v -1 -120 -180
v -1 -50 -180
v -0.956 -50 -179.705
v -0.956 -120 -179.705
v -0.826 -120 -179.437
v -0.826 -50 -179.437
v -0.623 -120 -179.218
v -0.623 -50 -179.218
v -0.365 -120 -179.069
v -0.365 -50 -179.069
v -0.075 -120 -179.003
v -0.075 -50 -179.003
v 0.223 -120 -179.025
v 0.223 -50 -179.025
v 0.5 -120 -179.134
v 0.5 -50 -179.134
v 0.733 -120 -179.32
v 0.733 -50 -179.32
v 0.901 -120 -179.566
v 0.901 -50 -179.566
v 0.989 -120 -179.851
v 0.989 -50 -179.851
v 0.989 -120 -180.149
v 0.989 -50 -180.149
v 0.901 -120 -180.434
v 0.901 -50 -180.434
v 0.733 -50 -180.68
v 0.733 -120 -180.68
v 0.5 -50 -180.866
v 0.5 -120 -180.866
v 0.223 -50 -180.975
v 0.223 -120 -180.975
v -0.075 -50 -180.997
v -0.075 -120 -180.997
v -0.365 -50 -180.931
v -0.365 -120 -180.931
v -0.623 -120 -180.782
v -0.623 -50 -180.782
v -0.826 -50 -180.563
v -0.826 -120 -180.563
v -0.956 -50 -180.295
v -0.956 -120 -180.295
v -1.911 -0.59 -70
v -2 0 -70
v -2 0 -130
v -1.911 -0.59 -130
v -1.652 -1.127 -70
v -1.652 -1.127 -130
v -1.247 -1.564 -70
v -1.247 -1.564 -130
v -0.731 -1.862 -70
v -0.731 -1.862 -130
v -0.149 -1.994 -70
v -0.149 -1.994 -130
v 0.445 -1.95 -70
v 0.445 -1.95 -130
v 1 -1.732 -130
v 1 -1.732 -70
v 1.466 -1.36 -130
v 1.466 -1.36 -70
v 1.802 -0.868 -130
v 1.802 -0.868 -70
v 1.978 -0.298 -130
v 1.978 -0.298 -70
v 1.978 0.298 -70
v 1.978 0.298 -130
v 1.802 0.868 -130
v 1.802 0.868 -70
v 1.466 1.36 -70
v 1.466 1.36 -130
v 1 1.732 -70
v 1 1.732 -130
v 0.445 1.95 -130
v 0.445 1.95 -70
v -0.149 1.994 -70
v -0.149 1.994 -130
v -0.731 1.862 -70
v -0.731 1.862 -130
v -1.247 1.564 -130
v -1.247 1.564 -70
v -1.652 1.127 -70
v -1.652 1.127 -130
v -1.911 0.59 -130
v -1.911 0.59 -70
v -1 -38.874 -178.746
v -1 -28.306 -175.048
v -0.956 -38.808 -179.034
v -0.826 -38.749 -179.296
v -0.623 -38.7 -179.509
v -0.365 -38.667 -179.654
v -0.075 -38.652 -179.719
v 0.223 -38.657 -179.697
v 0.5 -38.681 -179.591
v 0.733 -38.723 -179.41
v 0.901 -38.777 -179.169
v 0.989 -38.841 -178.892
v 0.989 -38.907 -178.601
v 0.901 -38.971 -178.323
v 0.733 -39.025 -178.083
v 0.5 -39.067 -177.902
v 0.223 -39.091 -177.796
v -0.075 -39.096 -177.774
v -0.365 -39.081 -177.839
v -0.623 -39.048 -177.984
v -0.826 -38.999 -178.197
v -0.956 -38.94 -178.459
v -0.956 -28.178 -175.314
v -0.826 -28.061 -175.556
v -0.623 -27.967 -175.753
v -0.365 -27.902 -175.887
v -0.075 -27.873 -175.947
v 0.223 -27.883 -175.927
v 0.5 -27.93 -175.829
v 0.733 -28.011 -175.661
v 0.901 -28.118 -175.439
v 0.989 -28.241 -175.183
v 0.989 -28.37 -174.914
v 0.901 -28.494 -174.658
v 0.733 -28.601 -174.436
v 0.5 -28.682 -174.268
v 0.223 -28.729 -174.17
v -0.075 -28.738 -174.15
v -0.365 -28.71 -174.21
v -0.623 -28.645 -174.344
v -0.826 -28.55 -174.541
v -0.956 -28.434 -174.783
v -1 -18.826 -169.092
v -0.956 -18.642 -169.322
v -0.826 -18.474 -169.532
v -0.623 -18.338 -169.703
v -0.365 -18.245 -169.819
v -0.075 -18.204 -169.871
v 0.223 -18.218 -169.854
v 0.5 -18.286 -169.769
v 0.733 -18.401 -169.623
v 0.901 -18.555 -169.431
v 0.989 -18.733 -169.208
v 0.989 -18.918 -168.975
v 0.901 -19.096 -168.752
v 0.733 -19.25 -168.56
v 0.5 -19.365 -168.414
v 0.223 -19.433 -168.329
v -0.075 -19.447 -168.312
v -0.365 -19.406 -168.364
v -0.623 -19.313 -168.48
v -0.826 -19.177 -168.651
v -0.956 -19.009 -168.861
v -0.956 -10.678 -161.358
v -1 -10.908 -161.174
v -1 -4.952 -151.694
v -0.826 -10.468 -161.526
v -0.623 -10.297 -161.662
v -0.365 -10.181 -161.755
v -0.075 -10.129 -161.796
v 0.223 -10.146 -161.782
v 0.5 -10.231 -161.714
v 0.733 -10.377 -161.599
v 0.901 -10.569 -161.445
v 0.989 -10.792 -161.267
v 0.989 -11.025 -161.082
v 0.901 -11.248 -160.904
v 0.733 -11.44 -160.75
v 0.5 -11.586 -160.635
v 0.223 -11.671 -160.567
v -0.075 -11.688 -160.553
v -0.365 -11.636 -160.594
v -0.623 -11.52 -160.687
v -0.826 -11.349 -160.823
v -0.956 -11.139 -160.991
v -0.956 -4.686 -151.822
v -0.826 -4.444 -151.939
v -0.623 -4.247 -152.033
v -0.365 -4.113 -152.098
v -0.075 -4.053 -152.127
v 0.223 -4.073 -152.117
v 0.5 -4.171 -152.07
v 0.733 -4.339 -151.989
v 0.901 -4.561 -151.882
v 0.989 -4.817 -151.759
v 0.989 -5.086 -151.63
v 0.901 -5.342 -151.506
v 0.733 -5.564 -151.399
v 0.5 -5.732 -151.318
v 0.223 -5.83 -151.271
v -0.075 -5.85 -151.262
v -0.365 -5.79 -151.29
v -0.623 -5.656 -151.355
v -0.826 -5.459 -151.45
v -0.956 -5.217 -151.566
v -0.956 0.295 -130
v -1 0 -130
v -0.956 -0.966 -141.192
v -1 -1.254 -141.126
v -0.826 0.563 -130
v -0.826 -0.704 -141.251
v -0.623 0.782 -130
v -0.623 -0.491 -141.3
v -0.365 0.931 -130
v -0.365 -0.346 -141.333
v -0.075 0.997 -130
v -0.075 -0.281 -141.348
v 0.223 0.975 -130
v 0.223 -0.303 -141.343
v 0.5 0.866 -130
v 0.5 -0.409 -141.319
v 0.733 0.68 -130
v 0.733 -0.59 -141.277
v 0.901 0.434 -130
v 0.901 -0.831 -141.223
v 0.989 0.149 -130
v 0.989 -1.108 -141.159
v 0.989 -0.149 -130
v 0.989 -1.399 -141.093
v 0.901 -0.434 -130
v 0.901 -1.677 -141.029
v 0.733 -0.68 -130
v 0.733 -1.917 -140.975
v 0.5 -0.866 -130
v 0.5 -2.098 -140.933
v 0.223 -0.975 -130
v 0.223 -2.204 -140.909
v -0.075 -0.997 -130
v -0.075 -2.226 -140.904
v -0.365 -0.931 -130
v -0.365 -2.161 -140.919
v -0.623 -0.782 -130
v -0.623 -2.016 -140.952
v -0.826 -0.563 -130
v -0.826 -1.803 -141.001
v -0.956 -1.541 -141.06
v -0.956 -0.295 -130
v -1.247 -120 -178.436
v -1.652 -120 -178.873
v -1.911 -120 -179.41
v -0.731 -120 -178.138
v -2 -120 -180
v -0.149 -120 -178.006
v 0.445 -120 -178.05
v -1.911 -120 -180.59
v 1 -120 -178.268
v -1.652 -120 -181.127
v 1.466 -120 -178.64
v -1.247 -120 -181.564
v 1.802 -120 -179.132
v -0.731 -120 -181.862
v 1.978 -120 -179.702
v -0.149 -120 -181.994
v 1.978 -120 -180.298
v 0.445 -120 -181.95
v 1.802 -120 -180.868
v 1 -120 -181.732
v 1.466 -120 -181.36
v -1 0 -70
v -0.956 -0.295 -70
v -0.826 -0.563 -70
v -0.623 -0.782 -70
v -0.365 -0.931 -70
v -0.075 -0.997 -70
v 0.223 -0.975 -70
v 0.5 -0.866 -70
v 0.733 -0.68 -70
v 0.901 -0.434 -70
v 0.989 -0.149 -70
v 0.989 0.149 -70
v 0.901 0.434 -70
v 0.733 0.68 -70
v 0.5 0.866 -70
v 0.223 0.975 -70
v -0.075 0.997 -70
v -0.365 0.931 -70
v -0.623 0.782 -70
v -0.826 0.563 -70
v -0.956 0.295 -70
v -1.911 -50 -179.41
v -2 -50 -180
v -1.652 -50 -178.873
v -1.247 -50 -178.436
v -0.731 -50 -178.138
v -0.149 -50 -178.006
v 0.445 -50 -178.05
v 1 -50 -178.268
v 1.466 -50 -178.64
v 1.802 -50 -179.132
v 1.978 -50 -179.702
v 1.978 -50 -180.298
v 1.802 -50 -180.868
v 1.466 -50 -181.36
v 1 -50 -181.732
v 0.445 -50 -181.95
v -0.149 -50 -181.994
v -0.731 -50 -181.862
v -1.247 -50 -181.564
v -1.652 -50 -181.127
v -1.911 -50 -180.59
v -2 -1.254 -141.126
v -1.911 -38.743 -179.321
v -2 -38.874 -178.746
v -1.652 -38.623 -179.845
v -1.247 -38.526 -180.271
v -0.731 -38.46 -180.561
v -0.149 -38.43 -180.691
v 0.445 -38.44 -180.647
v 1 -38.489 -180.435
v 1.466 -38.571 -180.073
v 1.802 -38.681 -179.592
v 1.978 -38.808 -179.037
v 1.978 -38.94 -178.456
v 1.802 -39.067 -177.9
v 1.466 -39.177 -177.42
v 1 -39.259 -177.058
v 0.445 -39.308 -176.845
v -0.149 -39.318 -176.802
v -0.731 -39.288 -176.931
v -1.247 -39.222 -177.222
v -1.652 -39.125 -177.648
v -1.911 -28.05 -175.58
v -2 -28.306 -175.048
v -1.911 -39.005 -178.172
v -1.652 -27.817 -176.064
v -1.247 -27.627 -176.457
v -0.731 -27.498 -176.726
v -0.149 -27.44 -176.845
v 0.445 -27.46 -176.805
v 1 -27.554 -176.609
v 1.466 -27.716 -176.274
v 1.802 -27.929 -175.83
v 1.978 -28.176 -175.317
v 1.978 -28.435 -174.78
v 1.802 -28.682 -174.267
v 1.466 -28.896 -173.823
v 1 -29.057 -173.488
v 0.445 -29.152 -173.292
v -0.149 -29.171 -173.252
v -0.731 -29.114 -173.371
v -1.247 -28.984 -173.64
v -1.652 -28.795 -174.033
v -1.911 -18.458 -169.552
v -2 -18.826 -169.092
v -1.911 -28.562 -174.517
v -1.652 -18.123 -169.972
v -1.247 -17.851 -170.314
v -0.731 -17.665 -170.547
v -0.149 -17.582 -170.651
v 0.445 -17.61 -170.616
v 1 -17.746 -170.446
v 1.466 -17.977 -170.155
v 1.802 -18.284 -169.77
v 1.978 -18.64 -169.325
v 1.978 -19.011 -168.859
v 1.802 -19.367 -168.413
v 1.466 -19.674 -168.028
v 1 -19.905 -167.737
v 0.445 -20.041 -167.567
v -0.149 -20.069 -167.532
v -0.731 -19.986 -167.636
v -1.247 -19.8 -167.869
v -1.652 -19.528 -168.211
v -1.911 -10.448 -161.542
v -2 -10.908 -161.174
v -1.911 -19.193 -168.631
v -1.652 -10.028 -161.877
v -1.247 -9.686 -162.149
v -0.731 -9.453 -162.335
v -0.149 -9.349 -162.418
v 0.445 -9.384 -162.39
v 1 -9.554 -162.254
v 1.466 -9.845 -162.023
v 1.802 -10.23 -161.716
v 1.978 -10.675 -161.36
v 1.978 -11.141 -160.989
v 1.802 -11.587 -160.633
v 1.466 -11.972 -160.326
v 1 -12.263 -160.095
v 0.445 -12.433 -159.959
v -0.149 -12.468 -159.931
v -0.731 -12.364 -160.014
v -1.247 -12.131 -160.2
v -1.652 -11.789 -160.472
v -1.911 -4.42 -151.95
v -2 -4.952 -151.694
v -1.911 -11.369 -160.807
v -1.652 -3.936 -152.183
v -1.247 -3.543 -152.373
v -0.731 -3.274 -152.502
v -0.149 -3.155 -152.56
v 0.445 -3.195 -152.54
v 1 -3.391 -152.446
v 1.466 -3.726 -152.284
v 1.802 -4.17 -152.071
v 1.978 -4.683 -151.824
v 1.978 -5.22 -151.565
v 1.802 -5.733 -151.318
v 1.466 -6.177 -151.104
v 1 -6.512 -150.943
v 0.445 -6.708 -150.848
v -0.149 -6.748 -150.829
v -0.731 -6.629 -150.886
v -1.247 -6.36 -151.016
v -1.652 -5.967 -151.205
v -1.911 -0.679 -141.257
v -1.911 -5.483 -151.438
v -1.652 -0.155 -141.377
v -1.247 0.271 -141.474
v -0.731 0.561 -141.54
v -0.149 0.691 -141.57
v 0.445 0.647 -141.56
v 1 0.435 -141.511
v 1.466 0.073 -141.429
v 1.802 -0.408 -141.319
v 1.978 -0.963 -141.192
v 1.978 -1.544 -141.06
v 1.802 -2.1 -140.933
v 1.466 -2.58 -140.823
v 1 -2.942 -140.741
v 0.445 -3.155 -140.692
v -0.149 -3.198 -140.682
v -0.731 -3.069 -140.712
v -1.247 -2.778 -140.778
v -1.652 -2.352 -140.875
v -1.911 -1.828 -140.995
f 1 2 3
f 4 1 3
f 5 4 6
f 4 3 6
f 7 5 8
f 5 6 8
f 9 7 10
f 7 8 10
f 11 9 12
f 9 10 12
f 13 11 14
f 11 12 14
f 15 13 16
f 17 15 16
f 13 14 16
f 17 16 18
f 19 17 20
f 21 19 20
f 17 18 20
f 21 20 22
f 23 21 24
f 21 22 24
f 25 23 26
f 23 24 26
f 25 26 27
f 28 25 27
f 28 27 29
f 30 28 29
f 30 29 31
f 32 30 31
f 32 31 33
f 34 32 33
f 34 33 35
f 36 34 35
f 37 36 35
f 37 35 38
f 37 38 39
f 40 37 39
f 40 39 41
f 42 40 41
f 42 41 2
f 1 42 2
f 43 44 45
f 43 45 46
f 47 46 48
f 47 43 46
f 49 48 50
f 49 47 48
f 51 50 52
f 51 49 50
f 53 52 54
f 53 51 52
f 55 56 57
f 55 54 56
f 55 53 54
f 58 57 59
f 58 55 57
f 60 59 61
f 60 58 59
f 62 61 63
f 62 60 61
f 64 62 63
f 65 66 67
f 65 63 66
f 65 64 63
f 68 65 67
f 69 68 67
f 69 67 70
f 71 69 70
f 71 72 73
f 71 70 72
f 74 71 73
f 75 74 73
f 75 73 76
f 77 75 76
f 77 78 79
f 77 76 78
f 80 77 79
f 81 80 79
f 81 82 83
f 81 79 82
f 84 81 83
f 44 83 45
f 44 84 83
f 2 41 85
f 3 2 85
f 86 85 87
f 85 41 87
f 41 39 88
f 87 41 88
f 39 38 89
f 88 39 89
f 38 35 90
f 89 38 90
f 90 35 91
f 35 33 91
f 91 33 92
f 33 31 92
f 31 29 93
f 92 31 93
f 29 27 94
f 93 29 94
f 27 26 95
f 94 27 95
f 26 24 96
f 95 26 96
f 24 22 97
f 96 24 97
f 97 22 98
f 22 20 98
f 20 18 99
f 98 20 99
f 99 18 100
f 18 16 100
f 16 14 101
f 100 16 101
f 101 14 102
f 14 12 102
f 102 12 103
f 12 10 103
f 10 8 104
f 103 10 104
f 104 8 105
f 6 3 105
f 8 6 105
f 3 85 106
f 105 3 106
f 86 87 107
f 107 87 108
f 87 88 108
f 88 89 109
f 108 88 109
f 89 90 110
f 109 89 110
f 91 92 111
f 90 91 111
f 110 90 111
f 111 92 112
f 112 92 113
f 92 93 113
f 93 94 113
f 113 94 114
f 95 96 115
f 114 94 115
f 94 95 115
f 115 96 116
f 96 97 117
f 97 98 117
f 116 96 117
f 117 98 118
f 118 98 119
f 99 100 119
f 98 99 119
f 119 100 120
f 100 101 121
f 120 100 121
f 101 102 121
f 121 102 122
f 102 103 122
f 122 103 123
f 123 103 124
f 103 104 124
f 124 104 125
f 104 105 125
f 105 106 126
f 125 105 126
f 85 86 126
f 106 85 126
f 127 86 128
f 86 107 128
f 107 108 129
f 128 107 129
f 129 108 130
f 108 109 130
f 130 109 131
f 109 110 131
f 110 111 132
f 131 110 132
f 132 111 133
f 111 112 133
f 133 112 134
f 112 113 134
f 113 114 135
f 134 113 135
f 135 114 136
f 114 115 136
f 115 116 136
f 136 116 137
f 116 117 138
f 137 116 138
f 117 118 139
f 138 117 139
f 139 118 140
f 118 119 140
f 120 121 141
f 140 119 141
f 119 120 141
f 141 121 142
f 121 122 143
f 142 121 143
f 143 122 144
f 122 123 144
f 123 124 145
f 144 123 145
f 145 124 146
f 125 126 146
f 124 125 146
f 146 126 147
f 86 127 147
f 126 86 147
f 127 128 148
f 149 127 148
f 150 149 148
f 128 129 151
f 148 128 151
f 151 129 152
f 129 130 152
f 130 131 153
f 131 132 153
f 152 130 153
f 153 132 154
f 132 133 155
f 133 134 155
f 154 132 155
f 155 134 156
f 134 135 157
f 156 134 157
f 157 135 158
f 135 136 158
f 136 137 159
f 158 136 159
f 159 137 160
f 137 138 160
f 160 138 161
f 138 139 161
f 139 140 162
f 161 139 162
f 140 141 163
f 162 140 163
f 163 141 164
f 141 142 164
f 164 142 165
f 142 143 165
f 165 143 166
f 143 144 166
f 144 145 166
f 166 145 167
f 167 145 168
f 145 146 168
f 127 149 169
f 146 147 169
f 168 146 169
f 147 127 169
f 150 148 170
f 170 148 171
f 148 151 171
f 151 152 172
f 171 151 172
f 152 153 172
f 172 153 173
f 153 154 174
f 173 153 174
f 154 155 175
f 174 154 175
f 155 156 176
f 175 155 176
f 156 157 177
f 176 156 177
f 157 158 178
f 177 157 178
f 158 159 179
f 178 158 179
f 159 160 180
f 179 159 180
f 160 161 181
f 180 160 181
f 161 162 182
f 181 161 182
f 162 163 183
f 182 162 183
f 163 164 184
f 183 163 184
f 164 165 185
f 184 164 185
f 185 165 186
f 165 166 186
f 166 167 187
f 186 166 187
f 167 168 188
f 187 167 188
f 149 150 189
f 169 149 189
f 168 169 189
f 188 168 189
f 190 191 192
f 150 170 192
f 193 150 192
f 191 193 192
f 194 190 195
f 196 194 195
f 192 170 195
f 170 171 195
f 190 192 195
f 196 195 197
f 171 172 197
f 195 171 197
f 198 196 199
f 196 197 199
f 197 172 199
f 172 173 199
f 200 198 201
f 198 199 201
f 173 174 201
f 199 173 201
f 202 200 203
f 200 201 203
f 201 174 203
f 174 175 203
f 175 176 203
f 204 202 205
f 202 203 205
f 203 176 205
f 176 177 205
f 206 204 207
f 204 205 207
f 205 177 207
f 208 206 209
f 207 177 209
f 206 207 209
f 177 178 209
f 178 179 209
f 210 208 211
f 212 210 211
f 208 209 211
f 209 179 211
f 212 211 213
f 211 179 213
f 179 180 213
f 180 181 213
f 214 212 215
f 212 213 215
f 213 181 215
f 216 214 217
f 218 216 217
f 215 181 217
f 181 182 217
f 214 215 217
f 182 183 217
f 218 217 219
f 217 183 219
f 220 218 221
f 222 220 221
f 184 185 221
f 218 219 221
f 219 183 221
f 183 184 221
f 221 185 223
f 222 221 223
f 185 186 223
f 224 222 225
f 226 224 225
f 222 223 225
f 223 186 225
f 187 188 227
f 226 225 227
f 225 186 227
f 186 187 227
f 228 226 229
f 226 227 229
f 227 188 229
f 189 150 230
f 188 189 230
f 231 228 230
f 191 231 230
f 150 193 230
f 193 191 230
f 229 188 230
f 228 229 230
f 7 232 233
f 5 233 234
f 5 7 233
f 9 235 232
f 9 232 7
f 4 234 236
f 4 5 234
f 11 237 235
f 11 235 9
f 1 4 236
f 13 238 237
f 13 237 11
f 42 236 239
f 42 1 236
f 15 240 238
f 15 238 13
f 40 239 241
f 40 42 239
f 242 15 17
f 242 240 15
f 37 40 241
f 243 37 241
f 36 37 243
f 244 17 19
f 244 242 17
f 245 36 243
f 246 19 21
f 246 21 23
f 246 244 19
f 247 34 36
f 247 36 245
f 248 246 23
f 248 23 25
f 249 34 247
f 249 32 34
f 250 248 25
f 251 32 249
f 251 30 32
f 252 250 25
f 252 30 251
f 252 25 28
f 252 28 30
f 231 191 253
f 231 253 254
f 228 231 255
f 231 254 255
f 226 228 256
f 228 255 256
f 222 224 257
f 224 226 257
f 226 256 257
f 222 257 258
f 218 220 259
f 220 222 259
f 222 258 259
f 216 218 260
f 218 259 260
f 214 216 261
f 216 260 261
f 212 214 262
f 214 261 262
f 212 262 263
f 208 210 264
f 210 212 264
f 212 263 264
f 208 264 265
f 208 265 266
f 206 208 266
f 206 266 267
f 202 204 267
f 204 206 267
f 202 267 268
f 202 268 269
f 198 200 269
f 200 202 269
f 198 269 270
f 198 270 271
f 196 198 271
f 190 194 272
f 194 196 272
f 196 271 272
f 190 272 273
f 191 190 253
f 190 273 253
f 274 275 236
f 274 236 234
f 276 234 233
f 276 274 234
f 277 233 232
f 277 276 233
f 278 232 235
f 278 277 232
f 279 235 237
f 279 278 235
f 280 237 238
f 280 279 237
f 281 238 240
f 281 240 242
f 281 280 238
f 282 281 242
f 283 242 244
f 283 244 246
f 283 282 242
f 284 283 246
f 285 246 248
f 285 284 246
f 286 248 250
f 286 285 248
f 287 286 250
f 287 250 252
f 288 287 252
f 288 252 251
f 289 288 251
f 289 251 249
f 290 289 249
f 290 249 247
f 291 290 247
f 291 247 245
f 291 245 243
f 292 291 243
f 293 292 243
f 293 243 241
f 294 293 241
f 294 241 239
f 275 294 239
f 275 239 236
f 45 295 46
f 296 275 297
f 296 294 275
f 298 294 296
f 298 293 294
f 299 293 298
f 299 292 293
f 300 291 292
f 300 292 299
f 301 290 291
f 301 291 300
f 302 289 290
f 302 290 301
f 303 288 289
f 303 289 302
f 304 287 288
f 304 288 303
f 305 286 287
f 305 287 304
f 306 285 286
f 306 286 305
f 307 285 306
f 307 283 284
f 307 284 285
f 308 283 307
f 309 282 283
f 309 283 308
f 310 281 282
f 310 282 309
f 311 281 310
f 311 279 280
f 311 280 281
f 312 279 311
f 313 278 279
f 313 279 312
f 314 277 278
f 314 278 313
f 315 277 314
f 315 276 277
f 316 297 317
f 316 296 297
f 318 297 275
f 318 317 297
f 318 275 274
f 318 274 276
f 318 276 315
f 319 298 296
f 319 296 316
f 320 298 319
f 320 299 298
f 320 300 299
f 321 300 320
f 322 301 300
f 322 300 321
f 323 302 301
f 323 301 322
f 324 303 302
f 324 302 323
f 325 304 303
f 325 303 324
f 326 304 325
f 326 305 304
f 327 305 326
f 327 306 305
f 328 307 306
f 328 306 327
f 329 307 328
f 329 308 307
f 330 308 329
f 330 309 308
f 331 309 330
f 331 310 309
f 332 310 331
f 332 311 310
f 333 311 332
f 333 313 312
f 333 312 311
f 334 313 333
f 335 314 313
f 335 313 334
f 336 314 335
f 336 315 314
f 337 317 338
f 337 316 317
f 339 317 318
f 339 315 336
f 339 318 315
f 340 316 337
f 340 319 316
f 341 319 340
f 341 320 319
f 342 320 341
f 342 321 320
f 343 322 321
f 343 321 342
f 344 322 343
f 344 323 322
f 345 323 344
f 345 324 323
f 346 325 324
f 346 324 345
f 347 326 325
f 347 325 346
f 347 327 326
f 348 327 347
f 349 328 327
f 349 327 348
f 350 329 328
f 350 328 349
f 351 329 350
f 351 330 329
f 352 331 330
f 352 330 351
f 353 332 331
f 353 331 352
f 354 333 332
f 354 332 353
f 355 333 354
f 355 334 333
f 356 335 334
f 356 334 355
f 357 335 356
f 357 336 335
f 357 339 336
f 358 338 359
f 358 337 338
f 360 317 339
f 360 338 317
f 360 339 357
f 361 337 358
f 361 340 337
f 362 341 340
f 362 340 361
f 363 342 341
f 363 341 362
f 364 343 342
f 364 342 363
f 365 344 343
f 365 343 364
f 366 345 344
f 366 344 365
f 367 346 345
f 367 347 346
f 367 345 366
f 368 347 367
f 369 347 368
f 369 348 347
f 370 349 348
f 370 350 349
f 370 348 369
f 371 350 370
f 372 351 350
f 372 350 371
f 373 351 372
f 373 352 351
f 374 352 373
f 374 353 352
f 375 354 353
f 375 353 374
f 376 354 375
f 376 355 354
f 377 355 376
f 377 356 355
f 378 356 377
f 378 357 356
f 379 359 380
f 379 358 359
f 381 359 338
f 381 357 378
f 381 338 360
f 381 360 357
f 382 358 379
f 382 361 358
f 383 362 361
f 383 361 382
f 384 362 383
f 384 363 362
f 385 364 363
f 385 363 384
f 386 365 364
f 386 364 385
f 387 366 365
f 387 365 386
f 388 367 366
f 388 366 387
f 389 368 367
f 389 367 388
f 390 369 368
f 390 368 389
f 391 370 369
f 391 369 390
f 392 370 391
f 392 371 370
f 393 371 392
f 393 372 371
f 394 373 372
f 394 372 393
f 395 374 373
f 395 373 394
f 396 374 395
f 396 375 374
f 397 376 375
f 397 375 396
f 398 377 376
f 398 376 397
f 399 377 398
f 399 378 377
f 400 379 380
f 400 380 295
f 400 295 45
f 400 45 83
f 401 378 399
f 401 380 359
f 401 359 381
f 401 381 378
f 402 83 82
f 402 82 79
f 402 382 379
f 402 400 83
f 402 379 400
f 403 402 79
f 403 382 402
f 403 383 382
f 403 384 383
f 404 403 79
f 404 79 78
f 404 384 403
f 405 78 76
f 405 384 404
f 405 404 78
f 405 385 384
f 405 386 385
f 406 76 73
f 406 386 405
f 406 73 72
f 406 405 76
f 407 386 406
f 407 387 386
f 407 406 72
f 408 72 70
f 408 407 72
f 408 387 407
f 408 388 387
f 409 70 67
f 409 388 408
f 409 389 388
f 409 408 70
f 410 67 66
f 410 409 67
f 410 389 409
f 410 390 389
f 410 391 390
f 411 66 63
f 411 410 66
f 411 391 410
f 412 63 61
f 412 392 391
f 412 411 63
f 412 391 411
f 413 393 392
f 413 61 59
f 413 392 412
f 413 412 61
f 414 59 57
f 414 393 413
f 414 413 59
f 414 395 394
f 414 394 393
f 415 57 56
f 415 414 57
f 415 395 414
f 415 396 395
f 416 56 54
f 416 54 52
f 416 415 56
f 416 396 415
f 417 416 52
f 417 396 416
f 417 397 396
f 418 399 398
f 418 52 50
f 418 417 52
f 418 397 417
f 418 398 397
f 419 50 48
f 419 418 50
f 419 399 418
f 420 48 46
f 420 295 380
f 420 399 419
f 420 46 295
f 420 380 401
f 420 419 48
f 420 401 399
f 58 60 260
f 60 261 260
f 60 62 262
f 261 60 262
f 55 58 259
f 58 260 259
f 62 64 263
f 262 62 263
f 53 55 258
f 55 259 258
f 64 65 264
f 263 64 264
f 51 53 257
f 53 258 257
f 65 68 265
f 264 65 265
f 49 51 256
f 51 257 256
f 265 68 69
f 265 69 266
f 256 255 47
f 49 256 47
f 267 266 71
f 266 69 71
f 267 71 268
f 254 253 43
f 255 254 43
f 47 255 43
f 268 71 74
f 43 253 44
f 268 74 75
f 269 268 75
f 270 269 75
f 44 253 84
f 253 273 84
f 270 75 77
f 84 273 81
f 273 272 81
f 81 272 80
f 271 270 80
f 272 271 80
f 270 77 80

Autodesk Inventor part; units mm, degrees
ref_plane "YZ Plane" through (0, 0, 0) normal (1, 0, 0) x (0, 1, 0)
ref_plane "XZ Plane" through (0, 0, 0) normal (0, 1, 0) x (-1, 0, 0)
ref_plane "XY Plane" through (0, 0, 0) normal (0, 0, 1) x (1, 0, 0)
ref_plane "РабПлоскость2" through (0, 0, -70) normal (0, 0, -1) x (-1, 0, 0)
sketch "Эскиз4" plane through (0, 0, 0) normal (1, 0, 0) x (0, 1, 0)
  line L0 (-2, -70) -> (2, -70)
  line L1 (-50, -180) -> (-120, -180)
  arc A0 (-50, -180) -> (0, -130) centre (-50, -130) ccw
  line L2 (0, -130) -> (0, -70)
  line L3 (2, -70) -> (-250, -70) construction
  dimension "d9" = 60
  dimension "d11" = 50
  dimension "d13" = 70
sketch "Эскиз5" plane through (0, 0, -70) normal (0, 0, -1) x (-1, 0, 0)
  circle A0 centre (0, 0) radius 1 projected
  circle A1 centre (0, 0) radius 2 projected
sweep "Сдвиг2" add profiles "Эскиз5" path "Эскиз4" path curves L2 A0 L1
properties part number "тефлон"
